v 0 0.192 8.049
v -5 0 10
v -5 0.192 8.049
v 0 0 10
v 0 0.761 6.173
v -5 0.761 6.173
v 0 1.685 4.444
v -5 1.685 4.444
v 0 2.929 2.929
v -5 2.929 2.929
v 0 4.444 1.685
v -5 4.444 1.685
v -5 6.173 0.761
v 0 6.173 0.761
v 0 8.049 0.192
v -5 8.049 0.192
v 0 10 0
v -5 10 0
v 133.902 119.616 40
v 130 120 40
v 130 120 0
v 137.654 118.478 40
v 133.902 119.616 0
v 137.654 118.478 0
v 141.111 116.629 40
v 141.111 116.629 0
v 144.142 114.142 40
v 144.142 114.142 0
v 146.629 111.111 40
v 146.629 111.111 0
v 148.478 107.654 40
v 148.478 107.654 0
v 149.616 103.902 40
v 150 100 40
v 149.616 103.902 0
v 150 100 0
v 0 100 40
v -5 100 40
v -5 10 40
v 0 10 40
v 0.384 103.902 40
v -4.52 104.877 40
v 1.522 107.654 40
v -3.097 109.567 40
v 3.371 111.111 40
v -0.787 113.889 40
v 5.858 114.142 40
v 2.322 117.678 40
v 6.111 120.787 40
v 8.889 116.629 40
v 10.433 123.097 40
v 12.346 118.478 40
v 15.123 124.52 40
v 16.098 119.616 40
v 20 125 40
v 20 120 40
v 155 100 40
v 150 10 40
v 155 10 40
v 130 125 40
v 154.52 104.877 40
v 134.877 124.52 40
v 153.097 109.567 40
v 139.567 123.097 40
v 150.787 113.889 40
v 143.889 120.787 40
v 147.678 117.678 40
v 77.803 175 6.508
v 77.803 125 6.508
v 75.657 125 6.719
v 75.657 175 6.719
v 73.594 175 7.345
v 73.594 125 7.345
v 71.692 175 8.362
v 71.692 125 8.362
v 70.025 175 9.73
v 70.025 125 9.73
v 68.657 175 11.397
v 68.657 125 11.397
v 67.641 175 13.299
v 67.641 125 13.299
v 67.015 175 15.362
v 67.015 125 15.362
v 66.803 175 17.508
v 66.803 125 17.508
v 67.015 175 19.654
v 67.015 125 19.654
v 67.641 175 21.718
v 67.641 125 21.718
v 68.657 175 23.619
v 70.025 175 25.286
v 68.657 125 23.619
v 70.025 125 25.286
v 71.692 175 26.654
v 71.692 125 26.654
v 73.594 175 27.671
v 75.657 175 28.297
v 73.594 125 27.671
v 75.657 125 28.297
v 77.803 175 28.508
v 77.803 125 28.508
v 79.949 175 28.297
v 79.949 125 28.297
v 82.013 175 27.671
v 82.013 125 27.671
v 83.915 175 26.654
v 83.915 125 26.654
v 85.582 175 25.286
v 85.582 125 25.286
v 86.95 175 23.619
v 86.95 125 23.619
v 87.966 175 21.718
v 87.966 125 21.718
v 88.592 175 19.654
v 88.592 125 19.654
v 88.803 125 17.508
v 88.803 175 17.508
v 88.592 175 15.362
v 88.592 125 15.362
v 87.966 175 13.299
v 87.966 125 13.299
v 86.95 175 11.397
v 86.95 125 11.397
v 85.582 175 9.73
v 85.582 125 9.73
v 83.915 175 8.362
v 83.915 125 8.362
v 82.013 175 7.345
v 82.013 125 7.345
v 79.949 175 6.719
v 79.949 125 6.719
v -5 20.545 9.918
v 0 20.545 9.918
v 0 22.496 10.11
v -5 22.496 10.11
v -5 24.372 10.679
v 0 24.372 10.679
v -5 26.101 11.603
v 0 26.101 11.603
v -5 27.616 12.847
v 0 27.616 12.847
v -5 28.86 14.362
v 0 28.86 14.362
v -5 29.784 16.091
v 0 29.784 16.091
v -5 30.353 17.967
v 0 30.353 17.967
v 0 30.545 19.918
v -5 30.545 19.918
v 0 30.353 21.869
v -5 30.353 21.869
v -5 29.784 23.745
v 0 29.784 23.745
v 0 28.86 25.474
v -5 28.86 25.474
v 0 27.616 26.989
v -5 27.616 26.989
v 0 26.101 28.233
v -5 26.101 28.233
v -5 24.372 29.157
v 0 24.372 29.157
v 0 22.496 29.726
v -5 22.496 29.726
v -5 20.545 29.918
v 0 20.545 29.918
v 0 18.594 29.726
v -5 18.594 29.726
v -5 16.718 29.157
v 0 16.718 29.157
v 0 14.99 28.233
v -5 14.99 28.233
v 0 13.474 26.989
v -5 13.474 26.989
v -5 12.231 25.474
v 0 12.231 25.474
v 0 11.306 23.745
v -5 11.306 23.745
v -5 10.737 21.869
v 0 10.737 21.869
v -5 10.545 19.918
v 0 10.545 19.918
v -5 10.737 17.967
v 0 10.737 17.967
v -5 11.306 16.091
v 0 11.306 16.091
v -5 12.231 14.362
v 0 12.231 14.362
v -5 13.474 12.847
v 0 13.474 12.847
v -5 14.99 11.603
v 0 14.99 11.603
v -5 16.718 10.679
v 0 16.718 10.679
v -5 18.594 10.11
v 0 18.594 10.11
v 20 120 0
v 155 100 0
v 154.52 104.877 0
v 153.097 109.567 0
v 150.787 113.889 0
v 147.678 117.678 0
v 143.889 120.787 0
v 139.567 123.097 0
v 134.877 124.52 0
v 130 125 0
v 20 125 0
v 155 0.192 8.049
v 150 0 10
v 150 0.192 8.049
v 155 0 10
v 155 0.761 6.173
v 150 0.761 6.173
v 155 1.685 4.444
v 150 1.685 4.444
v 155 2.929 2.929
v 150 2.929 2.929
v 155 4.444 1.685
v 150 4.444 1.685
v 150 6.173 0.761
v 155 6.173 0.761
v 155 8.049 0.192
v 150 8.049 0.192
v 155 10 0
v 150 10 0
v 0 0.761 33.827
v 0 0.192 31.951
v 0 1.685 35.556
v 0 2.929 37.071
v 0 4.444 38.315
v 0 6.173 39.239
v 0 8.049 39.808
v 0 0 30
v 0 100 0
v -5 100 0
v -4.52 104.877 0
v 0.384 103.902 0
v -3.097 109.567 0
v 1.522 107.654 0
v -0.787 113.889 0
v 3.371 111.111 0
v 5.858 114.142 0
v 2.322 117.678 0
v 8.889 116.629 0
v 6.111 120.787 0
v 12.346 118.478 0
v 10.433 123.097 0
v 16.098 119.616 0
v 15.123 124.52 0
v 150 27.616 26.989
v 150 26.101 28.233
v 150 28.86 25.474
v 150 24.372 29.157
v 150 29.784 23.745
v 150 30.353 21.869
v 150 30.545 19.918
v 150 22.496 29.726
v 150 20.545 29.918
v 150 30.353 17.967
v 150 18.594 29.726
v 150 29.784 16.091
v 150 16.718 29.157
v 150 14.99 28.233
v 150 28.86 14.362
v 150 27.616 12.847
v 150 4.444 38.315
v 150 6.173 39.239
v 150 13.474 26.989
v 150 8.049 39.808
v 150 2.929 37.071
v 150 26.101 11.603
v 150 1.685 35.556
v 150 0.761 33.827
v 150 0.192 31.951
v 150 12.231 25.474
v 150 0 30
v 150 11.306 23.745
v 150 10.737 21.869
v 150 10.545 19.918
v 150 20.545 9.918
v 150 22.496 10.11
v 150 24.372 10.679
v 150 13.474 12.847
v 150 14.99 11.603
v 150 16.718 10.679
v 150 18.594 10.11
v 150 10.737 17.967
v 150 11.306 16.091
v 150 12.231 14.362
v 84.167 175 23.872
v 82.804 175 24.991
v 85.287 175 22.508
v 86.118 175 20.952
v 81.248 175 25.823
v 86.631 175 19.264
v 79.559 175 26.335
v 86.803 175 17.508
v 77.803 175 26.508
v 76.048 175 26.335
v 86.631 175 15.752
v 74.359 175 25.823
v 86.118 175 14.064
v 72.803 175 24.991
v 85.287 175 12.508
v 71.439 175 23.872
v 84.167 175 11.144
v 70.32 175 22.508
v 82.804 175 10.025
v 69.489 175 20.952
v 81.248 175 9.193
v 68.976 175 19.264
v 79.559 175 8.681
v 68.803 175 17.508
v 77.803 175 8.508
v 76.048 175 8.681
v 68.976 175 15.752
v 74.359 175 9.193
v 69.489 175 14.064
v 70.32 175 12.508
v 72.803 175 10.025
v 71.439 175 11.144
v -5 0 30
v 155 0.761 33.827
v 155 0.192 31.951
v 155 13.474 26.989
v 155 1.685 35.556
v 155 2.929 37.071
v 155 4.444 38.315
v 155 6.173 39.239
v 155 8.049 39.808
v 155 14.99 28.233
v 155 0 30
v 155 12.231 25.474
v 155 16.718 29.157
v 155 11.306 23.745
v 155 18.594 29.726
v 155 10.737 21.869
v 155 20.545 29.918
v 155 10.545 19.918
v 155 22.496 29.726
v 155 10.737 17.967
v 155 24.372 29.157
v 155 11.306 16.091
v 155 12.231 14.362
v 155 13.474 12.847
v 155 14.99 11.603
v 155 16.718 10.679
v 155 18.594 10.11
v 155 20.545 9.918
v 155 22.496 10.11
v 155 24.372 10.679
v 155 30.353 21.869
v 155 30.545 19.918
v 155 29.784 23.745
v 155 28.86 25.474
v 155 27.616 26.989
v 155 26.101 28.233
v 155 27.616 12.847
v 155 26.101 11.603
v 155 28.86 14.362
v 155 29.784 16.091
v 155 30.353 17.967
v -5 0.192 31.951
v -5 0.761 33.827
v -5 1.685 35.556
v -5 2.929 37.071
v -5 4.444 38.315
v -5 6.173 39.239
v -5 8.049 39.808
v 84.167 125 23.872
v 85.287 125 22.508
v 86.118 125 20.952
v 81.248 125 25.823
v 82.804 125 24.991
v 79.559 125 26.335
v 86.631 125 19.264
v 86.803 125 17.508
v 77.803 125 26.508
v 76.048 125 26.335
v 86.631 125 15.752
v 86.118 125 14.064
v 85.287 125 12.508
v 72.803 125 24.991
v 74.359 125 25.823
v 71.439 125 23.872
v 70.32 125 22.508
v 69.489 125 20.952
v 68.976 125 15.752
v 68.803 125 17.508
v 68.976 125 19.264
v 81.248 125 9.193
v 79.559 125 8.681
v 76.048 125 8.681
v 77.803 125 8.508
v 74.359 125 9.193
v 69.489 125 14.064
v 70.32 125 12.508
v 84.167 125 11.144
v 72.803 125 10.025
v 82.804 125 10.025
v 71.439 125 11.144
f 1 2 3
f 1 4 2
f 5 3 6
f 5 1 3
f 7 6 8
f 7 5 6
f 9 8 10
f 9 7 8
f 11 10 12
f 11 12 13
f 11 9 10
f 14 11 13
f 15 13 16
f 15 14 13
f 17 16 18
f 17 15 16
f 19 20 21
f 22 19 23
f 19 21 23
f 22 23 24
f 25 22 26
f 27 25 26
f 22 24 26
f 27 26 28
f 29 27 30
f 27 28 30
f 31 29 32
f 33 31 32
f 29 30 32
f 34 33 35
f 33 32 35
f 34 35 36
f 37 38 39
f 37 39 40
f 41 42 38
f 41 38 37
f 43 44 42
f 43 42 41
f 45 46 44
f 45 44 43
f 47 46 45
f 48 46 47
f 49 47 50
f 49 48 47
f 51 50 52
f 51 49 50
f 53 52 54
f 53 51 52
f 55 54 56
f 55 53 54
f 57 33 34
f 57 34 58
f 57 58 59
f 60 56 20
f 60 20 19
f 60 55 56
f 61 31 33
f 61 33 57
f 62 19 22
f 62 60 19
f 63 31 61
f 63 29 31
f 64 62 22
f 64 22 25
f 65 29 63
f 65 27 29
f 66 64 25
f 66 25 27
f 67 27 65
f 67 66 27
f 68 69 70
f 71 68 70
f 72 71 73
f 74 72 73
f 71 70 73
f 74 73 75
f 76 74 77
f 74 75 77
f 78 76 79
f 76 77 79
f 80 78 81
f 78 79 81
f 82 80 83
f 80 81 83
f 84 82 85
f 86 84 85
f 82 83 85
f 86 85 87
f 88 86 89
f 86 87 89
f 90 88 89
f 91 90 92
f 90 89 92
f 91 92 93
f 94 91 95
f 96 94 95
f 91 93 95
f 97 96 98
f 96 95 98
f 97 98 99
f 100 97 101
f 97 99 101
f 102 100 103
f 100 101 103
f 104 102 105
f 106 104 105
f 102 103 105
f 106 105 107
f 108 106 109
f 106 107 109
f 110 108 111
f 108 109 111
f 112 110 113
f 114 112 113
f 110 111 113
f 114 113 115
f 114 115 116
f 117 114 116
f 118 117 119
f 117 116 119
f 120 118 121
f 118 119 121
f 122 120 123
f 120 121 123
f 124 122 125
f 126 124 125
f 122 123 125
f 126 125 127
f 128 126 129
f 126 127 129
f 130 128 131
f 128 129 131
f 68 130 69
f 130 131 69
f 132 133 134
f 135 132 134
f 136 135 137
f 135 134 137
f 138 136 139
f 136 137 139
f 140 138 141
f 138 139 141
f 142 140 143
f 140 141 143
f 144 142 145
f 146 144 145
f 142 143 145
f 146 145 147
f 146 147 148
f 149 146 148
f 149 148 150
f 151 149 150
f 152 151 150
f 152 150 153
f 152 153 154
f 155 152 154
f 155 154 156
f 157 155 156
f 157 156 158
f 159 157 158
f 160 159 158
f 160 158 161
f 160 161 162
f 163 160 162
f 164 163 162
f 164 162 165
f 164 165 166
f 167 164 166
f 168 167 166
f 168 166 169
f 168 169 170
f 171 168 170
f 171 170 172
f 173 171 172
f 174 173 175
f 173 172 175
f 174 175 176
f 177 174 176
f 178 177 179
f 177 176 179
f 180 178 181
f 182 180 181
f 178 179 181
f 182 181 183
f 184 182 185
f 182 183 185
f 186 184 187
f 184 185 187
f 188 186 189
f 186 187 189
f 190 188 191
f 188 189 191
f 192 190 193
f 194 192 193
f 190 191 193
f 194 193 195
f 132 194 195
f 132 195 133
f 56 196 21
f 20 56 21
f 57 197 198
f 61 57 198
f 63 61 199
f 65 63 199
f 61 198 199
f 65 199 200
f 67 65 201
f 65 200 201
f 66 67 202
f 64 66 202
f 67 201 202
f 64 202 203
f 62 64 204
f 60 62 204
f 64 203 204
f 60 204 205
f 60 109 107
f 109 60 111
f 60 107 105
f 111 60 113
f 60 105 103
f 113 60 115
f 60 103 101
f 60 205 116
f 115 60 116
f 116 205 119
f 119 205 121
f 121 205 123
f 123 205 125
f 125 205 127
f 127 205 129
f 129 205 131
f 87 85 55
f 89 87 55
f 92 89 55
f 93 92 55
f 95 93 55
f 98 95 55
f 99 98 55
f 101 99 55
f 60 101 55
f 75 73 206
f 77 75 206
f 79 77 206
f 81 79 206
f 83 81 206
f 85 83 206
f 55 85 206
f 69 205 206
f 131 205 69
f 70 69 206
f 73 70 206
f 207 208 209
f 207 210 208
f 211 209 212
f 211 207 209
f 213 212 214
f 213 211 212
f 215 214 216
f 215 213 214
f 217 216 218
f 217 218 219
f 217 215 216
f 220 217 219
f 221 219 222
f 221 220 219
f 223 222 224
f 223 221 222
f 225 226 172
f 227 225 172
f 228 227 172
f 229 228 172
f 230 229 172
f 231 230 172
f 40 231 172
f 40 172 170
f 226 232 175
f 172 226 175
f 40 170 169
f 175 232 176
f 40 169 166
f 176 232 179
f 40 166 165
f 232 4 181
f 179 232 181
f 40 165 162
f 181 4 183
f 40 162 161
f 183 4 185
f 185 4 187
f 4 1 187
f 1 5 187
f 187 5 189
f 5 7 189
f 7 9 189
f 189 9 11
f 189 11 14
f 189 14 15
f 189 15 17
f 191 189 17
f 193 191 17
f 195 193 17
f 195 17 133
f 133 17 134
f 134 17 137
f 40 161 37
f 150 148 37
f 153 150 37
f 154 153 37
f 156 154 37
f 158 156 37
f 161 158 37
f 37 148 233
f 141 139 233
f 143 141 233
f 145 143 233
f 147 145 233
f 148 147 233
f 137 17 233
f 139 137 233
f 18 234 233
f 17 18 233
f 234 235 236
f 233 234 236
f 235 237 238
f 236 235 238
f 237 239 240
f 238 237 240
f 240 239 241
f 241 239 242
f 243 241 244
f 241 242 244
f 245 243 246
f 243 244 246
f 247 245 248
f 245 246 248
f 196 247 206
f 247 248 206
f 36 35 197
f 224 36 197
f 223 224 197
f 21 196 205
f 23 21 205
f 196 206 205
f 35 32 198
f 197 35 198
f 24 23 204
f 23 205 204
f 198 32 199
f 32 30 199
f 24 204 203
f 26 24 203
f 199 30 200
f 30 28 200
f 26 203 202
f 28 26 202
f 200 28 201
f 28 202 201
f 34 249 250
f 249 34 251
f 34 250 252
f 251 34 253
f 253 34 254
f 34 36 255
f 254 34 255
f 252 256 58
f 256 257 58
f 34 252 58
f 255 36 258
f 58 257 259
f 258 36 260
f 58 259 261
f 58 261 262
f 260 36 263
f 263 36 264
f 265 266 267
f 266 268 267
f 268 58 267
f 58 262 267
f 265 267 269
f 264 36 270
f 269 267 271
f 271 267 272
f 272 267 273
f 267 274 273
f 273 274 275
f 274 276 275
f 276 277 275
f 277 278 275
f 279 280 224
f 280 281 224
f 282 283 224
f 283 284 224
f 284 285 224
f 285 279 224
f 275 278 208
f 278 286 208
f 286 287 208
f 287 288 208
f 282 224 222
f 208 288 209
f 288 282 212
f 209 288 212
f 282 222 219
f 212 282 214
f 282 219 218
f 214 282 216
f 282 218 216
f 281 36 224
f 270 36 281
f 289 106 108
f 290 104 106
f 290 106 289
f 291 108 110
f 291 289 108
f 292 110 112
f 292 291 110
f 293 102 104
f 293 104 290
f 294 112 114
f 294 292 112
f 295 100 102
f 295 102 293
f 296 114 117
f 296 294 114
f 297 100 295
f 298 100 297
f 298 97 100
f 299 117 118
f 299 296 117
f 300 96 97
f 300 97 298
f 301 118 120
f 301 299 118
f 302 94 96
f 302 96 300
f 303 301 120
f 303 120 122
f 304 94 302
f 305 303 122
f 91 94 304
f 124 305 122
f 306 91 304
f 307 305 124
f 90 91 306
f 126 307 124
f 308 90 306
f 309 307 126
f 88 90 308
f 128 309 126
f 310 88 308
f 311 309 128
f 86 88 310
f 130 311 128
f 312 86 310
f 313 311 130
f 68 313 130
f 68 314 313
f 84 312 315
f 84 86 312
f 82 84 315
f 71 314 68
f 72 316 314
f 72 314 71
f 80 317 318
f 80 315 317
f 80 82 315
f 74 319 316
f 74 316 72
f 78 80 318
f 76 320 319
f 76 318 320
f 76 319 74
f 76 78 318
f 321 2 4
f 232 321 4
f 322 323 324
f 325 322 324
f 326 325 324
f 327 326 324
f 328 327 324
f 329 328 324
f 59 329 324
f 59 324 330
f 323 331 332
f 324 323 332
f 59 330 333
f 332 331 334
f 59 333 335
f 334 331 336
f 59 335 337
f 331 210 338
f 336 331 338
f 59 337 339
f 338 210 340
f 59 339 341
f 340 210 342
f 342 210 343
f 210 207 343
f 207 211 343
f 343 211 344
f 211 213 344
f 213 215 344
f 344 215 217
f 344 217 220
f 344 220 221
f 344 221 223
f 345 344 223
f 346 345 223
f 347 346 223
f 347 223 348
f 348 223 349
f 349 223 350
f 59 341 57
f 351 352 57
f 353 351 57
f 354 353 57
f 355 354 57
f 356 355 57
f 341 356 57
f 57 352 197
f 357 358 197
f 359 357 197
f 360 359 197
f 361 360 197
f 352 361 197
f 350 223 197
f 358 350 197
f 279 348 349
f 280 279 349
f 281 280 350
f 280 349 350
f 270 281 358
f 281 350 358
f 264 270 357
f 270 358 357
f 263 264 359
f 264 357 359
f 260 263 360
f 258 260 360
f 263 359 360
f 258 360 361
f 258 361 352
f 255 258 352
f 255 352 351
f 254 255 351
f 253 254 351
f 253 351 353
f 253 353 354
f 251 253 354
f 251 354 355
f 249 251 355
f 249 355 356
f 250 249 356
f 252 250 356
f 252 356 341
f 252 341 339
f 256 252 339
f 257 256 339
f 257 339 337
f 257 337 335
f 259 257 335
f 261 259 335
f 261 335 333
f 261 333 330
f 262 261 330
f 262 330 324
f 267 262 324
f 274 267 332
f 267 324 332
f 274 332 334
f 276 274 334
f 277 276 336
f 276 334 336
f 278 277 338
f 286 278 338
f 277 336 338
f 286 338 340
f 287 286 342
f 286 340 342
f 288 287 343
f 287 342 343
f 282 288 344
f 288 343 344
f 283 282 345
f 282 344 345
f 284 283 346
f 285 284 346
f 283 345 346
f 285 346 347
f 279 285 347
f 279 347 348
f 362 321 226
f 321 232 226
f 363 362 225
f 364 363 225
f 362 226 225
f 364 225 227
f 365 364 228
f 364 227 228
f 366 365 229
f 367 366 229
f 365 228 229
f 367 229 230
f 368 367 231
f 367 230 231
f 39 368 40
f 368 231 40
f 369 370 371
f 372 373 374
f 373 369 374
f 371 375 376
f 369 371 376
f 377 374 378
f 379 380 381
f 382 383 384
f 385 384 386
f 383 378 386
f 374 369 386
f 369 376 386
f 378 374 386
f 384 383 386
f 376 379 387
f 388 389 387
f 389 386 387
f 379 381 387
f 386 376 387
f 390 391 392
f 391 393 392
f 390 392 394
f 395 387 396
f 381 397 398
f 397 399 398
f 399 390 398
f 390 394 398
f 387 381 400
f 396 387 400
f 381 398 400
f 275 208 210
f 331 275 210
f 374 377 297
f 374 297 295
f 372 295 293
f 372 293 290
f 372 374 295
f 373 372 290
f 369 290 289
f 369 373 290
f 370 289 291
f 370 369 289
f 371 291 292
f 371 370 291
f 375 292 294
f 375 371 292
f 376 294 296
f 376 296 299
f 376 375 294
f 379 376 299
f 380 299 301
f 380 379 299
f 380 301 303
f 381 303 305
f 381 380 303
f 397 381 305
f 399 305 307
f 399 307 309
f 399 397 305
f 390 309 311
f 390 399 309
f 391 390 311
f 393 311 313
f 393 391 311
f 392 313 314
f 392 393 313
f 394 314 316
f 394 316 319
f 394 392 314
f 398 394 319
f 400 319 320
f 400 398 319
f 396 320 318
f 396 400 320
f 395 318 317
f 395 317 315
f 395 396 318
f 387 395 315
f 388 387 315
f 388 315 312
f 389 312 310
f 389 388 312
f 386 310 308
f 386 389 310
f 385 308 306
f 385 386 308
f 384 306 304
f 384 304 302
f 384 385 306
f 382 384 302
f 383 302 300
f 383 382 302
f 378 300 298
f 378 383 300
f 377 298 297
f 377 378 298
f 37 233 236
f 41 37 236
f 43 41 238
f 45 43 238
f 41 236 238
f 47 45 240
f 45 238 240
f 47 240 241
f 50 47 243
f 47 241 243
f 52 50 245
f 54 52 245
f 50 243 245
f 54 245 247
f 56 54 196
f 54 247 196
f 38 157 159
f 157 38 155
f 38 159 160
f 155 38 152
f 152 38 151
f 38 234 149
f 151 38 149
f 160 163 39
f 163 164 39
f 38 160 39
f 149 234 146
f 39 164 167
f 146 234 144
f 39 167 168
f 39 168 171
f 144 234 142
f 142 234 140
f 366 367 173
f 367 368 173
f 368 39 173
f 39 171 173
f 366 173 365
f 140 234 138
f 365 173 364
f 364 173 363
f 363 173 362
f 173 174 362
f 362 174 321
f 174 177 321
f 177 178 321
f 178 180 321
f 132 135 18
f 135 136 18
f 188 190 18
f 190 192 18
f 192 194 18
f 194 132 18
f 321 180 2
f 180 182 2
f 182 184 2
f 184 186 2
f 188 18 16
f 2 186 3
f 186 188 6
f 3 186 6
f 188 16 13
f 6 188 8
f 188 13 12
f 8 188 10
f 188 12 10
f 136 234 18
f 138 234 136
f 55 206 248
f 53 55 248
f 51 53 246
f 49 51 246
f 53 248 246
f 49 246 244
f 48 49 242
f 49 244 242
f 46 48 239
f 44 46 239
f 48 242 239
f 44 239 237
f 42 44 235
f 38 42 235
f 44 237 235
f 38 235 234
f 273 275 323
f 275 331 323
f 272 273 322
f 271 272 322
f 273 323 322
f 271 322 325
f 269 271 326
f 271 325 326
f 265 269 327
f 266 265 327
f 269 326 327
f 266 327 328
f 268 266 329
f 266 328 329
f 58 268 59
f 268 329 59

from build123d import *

# Parameters (mm, degrees)
BASE_FLANGE1_DEPTH  = 40
FILLET1_R           = 10
SKETCH3_R           = 10
CUT_EXTRUDE1_DEPTH  = 207.942020866
SKETCH4_R           = 11
SKETCH4_R_2         = 9
BOSS_EXTRUDE1_DEPTH = 50


# Sheet-metal steps are written as plain solids
with BuildPart() as part:
    # Sketch1 → Base-Flange1 (new body)
    with BuildSketch(Plane.XY):
        with BuildLine():
            Line((0, 0), (0, 100))
            ThreePointArc((0, 100), (5.857864376, 114.142135624), (20, 120))
            Line((20, 120), (130, 120))
            ThreePointArc((130, 120), (144.142135624, 114.142135624), (150, 100))
            Line((150, 100), (150, 0))
            Line((150, 0), (155, 0))
            Line((155, 0), (155, 100))
            ThreePointArc((155, 100), (147.67766953, 117.67766953), (130, 125))
            Line((130, 125), (20, 125))
            ThreePointArc((20, 125), (2.32233047, 117.67766953), (-5, 100))
            Line((-5, 100), (-5, 0))
            Line((-5, 0), (0, 0))
        make_face()
    extrude(amount=BASE_FLANGE1_DEPTH)

    # Fillet1
    fillet1_edges = [part.edges().sort_by_distance(p)[0] for p in [
        (152.5, 0, 0),
        (-2.5, 0, 0),
        (152.5, 0, 40),
        (-2.5, 0, 40),
    ]]
    fillet(fillet1_edges, radius=FILLET1_R)

    # Sketch3 → Cut-Extrude1 (cut, through all)
    with BuildSketch(Plane(origin=(155, 0, 0), x_dir=(0, 0, -1), z_dir=(1, 0, 0))):
        with Locations((-19.918118103, 20.545243048)):
            Circle(SKETCH3_R)
    extrude(amount=-CUT_EXTRUDE1_DEPTH, mode=Mode.SUBTRACT)

    # Sketch4 → Boss-Extrude1 (add)
    with BuildSketch(Plane(origin=(0, 125, 0), x_dir=(1, 0, 0), z_dir=(0, 1, 0))):
        with Locations(Location((77.803452919, -17.50804185, 0), (0, 0, 90))):
            Circle(SKETCH4_R)
        with Locations(Location((77.803452919, -17.50804185, 0), (0, 0, 270))):
            Circle(SKETCH4_R_2, mode=Mode.SUBTRACT)
    extrude(amount=BOSS_EXTRUDE1_DEPTH)


solid = part.part
